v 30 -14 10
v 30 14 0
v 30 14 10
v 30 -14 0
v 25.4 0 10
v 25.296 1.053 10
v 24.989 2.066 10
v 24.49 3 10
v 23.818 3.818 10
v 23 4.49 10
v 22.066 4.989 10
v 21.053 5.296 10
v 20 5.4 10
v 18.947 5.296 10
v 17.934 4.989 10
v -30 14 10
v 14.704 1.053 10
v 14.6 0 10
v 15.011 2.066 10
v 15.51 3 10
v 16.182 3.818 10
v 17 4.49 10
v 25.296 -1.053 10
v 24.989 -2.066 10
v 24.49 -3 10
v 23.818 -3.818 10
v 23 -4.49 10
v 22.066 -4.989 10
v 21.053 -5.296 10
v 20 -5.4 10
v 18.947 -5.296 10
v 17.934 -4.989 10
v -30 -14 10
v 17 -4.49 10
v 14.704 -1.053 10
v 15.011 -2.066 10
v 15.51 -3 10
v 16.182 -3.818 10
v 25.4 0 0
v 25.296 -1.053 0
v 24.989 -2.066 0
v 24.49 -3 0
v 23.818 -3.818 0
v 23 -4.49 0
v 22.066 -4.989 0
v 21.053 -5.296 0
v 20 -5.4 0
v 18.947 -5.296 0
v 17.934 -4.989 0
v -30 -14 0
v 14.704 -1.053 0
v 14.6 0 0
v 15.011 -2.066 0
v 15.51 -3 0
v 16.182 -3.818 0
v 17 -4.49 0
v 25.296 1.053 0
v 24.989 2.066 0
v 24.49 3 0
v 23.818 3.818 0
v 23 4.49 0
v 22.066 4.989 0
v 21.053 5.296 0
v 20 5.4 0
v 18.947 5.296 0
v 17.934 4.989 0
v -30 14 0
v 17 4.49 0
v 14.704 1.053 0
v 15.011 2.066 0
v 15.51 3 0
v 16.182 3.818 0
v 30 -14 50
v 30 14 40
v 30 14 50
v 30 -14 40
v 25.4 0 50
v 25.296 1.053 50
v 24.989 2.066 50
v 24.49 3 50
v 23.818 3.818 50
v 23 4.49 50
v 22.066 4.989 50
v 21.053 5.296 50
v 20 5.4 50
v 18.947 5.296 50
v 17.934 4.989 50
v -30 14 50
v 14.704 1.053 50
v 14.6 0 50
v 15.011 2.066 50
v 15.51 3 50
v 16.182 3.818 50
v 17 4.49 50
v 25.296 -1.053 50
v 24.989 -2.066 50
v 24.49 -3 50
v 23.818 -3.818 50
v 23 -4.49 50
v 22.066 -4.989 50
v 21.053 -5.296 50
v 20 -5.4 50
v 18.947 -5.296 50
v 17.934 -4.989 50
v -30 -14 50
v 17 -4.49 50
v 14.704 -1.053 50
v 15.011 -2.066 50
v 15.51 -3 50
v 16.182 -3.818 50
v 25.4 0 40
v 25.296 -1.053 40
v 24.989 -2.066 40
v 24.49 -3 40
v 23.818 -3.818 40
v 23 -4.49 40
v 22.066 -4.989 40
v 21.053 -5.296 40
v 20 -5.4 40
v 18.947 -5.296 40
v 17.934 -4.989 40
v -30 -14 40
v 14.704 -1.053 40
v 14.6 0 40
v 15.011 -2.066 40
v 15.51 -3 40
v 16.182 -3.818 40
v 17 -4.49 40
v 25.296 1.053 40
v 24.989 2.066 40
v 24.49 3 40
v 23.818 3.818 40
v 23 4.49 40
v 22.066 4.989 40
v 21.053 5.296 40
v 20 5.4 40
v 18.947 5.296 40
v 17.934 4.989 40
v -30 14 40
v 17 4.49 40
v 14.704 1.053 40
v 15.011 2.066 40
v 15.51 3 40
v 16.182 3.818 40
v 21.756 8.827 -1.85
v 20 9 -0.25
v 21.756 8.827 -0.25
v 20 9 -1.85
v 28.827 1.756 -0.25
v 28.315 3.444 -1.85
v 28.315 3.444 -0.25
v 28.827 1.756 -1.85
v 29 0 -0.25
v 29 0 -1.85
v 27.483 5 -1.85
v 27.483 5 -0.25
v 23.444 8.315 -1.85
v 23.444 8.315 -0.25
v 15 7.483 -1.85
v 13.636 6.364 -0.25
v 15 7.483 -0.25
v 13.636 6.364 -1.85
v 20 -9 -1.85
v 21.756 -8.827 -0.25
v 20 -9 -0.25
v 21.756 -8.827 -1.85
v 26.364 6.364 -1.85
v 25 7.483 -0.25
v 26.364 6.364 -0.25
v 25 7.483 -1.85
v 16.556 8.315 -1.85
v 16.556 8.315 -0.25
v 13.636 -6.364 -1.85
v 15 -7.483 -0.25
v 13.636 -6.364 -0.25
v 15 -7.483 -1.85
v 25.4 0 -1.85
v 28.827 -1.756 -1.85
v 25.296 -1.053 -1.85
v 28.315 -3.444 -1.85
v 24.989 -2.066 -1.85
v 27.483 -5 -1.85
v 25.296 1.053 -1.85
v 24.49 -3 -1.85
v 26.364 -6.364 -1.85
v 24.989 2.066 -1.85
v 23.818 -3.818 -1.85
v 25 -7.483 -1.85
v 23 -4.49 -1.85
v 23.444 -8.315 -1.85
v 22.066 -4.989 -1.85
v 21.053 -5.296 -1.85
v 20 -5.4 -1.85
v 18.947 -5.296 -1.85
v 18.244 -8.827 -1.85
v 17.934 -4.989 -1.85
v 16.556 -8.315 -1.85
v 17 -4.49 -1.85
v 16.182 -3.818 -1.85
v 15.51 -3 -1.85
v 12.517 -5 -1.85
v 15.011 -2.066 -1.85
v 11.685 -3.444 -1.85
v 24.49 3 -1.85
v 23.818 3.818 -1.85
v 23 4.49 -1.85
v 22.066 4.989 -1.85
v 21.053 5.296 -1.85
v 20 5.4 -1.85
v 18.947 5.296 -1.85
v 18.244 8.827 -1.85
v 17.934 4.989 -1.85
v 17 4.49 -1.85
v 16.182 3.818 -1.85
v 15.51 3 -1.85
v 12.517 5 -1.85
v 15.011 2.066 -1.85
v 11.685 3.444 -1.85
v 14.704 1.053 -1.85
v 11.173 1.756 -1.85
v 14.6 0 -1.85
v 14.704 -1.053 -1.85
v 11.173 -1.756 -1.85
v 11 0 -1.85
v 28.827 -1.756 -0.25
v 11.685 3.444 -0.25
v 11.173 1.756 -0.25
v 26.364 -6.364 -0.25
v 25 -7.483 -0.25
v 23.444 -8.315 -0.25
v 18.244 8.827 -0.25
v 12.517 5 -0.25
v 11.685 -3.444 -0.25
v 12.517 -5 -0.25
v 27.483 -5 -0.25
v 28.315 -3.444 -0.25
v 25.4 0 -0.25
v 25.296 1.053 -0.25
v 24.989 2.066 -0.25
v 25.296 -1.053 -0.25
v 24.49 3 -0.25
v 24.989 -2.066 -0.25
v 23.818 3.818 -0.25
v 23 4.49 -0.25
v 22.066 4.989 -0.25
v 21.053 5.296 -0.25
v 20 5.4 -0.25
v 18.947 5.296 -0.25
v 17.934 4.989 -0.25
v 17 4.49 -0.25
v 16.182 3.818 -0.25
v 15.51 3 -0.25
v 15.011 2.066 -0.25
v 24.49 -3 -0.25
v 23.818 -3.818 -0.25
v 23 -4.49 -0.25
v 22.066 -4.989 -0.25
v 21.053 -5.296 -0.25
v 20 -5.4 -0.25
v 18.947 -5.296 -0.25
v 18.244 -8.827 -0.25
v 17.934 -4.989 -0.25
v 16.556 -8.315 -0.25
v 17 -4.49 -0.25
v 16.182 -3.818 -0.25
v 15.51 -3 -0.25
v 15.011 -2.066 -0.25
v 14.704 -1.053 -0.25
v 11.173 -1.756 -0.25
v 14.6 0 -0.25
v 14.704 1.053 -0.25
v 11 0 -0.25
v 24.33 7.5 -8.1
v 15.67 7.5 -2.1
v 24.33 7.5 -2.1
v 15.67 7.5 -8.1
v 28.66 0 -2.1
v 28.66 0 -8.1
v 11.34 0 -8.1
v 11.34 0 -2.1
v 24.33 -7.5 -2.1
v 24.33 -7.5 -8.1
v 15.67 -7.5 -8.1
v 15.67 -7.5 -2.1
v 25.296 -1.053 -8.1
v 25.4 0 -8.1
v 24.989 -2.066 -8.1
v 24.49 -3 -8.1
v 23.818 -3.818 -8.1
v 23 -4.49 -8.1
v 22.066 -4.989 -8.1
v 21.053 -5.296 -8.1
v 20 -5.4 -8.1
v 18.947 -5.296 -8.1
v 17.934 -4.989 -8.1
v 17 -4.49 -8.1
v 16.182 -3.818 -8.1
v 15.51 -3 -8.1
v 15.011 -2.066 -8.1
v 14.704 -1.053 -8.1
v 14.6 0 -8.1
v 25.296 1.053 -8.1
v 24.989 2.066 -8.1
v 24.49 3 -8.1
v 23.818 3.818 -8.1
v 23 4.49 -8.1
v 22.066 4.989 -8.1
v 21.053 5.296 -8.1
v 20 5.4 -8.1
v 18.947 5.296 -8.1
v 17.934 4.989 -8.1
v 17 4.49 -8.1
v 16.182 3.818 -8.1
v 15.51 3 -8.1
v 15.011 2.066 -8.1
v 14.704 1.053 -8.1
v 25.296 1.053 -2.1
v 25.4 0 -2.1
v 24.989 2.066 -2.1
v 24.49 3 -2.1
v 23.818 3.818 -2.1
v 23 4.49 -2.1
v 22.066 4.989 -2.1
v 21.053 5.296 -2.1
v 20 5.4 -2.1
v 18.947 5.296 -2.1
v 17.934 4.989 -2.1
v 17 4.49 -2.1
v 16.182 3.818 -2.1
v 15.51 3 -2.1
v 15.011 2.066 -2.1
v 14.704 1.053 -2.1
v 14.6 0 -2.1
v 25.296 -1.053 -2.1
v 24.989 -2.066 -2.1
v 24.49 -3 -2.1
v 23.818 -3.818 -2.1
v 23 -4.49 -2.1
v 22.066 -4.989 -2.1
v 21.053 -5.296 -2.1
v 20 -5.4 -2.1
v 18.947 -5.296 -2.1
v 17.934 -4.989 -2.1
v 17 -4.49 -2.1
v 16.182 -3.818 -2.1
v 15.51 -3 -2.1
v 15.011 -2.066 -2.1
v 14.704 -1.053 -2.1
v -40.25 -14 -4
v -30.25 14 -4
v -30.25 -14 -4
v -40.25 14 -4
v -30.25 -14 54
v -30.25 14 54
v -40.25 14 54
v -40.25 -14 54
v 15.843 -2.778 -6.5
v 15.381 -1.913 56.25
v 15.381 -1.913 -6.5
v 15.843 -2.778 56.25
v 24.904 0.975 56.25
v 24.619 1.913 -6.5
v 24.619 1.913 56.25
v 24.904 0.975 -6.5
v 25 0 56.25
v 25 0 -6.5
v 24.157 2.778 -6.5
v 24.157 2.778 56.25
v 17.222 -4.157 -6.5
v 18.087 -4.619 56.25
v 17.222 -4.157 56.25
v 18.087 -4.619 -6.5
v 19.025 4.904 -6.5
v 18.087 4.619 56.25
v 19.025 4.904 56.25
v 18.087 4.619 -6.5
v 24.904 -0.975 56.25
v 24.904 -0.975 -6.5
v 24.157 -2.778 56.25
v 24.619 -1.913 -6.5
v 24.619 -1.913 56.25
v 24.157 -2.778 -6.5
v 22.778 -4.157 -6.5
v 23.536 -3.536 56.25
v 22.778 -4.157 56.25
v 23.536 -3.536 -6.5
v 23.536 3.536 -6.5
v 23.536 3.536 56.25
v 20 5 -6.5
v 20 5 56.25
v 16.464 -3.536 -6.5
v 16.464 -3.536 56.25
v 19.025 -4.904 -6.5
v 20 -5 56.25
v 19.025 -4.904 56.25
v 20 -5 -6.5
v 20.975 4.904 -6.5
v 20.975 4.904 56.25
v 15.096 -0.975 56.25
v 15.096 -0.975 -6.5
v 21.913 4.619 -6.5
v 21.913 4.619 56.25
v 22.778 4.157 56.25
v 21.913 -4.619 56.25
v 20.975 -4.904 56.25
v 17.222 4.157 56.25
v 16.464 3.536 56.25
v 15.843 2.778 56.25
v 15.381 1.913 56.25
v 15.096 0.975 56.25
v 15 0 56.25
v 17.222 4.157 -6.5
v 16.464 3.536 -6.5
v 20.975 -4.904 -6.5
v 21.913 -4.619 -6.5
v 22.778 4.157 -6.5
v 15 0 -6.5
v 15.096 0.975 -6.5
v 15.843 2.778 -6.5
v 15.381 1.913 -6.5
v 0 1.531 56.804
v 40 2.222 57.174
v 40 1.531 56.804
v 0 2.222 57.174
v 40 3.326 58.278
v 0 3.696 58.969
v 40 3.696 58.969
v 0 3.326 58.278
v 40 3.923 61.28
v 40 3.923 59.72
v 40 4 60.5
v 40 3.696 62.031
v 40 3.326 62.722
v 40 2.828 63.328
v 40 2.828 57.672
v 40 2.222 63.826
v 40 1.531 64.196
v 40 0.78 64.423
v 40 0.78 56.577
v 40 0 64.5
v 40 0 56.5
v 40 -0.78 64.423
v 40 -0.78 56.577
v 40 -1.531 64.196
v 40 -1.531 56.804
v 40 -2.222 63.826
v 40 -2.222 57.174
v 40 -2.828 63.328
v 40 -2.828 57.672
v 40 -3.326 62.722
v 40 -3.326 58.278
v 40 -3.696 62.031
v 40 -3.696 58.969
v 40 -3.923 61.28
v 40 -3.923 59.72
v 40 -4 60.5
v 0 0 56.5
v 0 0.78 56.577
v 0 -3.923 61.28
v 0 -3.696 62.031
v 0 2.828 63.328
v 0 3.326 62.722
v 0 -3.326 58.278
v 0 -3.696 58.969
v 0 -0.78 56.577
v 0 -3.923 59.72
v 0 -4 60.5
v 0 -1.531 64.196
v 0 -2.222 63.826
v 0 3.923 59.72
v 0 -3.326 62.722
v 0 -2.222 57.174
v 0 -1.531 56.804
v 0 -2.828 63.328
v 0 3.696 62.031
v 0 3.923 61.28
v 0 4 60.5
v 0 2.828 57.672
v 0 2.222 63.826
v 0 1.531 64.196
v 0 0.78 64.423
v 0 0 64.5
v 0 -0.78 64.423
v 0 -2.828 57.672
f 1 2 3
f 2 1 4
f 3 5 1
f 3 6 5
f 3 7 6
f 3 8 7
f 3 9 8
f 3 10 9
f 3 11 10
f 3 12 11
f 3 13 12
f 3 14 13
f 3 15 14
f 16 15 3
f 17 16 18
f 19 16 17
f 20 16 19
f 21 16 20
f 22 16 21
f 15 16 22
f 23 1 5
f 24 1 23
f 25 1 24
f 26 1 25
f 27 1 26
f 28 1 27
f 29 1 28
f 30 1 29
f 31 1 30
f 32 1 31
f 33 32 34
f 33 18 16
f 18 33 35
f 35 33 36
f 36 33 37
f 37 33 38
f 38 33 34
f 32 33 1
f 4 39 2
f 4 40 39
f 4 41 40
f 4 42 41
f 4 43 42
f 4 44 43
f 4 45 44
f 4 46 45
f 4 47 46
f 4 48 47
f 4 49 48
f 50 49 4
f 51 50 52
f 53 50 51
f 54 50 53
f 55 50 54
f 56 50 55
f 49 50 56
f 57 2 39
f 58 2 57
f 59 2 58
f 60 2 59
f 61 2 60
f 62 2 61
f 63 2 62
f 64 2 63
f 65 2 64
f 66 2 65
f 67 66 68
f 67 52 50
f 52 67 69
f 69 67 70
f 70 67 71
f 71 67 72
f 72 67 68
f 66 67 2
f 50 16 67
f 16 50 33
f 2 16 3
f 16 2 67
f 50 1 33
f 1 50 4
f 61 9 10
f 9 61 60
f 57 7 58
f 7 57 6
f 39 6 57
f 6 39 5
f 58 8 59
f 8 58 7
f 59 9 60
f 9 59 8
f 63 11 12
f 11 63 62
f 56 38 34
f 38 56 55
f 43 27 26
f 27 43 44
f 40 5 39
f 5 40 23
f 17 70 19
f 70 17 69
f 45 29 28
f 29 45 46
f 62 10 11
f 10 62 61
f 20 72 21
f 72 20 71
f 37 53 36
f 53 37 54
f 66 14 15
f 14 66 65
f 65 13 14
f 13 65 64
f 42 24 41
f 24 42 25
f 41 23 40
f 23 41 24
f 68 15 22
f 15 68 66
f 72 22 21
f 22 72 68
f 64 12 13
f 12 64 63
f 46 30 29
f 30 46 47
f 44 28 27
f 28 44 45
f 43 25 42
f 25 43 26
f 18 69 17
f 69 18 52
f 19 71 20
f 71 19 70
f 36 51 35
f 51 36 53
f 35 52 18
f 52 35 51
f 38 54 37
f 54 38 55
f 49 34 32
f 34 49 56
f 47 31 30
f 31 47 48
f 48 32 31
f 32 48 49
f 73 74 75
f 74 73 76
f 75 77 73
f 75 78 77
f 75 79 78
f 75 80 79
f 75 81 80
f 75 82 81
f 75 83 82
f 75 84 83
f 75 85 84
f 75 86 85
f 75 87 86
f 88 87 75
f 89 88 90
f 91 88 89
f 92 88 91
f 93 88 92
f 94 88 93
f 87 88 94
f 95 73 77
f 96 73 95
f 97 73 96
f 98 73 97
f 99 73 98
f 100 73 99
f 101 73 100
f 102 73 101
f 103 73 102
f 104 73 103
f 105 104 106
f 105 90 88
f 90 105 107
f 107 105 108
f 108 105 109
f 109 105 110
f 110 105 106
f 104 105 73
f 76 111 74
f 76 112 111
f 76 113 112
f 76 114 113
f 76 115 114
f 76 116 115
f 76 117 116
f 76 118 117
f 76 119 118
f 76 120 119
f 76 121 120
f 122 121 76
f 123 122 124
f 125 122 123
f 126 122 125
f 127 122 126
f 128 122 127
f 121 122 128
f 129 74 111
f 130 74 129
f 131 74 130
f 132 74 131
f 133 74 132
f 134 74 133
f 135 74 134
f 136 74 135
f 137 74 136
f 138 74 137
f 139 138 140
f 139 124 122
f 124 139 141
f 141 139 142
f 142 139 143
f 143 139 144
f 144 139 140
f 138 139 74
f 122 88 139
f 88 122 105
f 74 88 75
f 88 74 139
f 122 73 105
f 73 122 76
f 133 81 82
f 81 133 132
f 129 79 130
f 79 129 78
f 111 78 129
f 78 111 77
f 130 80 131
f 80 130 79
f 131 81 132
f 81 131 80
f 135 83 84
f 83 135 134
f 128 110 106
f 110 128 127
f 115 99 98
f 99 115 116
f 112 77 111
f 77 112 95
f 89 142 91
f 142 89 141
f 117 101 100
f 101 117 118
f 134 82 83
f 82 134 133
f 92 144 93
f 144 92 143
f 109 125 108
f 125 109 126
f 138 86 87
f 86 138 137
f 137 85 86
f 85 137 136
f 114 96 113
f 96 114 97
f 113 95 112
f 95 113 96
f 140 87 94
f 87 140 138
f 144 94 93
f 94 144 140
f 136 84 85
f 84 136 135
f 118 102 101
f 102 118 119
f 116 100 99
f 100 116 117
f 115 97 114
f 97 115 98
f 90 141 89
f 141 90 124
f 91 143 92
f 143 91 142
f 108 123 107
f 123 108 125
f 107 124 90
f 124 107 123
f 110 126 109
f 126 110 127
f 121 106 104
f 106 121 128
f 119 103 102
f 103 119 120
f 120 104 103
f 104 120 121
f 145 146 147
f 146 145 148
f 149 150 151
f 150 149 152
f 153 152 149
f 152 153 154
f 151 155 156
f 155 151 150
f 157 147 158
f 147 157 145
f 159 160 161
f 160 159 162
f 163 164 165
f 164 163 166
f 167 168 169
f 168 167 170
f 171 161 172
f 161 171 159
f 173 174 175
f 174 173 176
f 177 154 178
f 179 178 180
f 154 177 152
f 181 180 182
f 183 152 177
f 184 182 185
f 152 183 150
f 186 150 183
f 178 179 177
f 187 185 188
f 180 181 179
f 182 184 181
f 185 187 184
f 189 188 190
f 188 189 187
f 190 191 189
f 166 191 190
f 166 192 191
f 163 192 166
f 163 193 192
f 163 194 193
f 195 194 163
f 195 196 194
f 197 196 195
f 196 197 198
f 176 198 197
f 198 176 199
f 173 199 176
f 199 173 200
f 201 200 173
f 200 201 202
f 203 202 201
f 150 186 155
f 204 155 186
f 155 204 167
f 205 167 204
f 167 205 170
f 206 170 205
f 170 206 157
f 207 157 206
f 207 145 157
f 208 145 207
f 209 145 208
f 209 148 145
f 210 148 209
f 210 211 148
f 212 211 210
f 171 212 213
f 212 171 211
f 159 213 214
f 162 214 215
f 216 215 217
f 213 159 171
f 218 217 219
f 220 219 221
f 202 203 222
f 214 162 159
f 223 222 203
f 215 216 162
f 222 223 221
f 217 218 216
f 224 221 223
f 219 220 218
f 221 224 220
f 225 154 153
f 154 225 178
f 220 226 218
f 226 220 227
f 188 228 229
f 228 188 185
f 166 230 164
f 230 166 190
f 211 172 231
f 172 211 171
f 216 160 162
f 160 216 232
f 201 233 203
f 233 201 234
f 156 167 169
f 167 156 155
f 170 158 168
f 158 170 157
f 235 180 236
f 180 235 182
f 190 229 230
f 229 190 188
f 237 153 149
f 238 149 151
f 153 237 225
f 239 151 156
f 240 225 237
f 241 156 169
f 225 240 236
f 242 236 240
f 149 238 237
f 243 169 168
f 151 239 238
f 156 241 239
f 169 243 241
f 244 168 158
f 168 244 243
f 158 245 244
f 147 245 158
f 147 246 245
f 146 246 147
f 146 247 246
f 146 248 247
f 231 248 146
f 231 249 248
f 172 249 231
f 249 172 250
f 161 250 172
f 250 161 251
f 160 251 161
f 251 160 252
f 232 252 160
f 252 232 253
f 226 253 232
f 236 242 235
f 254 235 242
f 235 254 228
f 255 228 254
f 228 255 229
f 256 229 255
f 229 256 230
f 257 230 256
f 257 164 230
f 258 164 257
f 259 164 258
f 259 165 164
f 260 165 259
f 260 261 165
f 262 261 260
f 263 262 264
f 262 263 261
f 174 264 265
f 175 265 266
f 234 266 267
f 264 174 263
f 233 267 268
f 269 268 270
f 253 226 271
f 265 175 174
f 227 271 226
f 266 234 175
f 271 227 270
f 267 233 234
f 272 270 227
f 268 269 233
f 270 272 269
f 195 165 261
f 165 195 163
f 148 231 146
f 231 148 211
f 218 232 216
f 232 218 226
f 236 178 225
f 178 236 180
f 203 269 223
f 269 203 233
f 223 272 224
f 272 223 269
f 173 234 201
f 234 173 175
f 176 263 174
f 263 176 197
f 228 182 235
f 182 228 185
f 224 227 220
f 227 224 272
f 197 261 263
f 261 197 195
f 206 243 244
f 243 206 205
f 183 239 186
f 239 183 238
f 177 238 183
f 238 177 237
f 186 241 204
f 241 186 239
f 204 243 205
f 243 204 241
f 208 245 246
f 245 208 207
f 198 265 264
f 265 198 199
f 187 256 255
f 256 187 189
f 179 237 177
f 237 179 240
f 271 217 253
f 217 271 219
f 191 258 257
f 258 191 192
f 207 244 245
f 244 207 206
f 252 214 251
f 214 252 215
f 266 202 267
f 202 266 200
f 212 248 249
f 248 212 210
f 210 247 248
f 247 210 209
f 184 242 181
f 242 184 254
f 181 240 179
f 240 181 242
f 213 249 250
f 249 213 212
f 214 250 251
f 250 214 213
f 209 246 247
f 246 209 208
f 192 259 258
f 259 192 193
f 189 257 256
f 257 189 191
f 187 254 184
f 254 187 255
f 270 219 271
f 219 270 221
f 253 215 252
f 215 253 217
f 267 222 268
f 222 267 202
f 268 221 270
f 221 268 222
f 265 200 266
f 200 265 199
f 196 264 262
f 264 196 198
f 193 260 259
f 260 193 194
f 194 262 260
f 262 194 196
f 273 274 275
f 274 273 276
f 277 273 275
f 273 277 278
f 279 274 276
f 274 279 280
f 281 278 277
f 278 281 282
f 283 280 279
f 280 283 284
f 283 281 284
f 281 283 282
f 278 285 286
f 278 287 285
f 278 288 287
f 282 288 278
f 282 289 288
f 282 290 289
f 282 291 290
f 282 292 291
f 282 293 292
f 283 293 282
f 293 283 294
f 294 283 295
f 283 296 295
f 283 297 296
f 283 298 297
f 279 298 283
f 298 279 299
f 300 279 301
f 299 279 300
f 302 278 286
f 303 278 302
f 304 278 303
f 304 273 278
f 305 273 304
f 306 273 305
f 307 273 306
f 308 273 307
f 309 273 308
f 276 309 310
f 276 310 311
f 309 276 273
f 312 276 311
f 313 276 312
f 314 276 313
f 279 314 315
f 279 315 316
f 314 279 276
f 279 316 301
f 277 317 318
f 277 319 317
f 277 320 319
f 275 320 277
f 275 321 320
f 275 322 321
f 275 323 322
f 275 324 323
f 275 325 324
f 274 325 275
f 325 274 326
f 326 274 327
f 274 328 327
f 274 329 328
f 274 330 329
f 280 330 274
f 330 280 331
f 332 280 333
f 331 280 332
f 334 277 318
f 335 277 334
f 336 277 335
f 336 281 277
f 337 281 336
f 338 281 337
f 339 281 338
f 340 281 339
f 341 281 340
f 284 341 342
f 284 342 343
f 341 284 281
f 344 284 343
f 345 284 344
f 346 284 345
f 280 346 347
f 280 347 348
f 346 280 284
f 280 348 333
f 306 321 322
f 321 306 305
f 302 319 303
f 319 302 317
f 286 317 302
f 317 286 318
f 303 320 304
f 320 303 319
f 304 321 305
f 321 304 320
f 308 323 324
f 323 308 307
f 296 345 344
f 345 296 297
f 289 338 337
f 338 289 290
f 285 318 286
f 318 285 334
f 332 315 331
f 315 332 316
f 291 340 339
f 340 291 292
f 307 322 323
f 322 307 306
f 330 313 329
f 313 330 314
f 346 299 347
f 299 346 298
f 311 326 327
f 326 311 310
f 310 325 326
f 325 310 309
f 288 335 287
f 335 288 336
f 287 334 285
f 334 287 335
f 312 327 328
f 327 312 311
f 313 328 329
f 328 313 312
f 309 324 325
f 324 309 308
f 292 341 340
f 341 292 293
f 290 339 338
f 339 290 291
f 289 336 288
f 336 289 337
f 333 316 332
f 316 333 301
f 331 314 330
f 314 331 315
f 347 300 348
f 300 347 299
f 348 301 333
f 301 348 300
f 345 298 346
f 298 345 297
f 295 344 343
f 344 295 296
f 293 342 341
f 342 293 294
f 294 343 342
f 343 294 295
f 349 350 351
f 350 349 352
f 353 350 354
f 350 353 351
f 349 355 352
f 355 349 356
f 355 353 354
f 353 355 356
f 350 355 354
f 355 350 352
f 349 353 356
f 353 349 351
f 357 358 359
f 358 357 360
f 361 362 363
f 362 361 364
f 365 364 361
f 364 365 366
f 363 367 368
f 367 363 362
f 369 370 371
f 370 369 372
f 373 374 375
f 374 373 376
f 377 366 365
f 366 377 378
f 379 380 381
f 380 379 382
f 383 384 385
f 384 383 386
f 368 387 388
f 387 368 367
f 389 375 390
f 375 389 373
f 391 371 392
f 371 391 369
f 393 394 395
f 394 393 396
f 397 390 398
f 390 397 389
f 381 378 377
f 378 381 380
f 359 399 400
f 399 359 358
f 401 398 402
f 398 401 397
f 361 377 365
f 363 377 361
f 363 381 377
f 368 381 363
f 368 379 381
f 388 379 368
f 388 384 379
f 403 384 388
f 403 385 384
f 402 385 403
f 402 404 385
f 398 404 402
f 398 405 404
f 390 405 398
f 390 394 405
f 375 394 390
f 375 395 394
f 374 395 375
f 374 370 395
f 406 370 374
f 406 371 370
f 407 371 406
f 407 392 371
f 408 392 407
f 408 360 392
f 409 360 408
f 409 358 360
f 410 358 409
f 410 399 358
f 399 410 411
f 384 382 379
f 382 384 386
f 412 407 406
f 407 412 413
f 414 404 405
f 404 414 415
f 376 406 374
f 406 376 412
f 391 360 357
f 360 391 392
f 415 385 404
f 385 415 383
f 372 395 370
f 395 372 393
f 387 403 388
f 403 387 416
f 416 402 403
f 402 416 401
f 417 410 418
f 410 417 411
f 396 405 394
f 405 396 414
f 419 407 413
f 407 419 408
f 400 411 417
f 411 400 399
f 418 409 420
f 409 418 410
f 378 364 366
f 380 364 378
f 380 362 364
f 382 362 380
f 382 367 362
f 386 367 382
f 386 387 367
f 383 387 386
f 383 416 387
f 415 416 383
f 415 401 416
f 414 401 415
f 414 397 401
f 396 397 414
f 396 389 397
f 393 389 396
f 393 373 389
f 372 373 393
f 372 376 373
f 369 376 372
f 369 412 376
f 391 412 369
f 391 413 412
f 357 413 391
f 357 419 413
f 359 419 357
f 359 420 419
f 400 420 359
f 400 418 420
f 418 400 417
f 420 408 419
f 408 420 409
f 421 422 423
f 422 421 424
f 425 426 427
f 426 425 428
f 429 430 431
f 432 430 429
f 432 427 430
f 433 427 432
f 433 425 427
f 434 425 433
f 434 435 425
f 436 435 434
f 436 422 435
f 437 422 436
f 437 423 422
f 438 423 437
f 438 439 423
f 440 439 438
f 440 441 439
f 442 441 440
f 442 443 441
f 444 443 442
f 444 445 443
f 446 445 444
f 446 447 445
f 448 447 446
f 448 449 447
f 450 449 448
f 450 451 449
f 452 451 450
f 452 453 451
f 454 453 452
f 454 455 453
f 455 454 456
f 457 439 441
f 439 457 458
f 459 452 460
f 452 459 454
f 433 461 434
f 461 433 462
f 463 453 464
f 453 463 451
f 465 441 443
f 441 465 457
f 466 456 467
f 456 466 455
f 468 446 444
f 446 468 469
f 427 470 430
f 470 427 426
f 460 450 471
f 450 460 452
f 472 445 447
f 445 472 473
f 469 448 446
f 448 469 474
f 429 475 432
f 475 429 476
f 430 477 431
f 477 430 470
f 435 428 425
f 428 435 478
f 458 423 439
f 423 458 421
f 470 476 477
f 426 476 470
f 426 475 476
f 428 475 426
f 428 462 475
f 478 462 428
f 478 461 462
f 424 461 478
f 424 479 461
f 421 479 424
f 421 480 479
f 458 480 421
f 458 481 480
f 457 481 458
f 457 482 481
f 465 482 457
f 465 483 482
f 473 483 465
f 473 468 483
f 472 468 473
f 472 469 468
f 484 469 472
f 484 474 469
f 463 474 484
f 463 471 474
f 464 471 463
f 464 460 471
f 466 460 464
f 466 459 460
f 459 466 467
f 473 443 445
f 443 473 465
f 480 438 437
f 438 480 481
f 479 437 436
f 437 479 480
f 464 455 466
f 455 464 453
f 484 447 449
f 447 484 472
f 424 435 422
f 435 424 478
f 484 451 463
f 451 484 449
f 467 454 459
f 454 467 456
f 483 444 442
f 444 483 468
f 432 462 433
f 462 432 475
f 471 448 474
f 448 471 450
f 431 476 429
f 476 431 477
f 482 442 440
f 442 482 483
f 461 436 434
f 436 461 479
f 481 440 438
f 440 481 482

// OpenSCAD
$fn = 32;

// ------------------------------------------------------------------------
// C clamp: throat 40 mm, screw d10
// Every part is its own module, assembly() places every instance.
// ------------------------------------------------------------------------

// --- part 1 ---
module clamp_arm() {
  difference() {
    translate([-30, -14, 0]) cube([60, 28, 10]);
    translate([20, 0, -1]) cylinder(h = 12, d = 10.8);
  }
}

// --- part 2 ---
module clamp_spine() {
  difference() {
    translate([-29, -14, 0]) cube([58, 28, 10]);
  }
}

// --- part 3 ---
module clamp_screw() {
  translate([0, 0, -31.375]) cylinder(h = 62.75, d = 10);
}

// --- part 4 ---
module clamp_washer() {
  difference() {
      translate([0, 0, 0]) cylinder(h = 1.6, d = 18);
      translate([0, 0, -1]) cylinder(h = 3.6, d = 10.8);
    }
}

// --- part 5 ---
module clamp_nut() {
  difference() {
    linear_extrude(height = 6) polygon(points = [[8.66, 0], [4.33, 7.5], [-4.33, 7.5], [-8.66, 0], [-4.33, -7.5], [4.33, -7.5]]);
    translate([0, 0, -1]) cylinder(h = 8, d = 10.8);
  }
}

// --- part 6 ---
module tommy_bar() {
  translate([0, 0, -20]) cylinder(h = 40, d = 8);
}

// --- assembly ---
module assembly() {
  color([0.80, 0.24, 0.20]) translate([0, 0, 0]) rotate([0, 0, 0]) clamp_arm();
  color([0.20, 0.45, 0.75]) translate([0, 0, 40]) rotate([0, 0, 0]) clamp_arm();
  color([0.25, 0.62, 0.32]) translate([-40.25, 0, 25]) rotate([0, 90, 0]) clamp_spine();
  color([0.92, 0.70, 0.18]) translate([20, 0, 24.875]) rotate([0, 0, 0]) clamp_screw();
  color([0.58, 0.35, 0.70]) translate([20, 0, -1.85]) rotate([0, 0, 0]) clamp_washer();
  color([0.16, 0.66, 0.66]) translate([20, 0, -8.1]) rotate([0, 0, 0]) clamp_nut();
  color([0.85, 0.48, 0.18]) translate([20, 0, 60.5]) rotate([0, 90, 0]) tommy_bar();
}

assembly();
